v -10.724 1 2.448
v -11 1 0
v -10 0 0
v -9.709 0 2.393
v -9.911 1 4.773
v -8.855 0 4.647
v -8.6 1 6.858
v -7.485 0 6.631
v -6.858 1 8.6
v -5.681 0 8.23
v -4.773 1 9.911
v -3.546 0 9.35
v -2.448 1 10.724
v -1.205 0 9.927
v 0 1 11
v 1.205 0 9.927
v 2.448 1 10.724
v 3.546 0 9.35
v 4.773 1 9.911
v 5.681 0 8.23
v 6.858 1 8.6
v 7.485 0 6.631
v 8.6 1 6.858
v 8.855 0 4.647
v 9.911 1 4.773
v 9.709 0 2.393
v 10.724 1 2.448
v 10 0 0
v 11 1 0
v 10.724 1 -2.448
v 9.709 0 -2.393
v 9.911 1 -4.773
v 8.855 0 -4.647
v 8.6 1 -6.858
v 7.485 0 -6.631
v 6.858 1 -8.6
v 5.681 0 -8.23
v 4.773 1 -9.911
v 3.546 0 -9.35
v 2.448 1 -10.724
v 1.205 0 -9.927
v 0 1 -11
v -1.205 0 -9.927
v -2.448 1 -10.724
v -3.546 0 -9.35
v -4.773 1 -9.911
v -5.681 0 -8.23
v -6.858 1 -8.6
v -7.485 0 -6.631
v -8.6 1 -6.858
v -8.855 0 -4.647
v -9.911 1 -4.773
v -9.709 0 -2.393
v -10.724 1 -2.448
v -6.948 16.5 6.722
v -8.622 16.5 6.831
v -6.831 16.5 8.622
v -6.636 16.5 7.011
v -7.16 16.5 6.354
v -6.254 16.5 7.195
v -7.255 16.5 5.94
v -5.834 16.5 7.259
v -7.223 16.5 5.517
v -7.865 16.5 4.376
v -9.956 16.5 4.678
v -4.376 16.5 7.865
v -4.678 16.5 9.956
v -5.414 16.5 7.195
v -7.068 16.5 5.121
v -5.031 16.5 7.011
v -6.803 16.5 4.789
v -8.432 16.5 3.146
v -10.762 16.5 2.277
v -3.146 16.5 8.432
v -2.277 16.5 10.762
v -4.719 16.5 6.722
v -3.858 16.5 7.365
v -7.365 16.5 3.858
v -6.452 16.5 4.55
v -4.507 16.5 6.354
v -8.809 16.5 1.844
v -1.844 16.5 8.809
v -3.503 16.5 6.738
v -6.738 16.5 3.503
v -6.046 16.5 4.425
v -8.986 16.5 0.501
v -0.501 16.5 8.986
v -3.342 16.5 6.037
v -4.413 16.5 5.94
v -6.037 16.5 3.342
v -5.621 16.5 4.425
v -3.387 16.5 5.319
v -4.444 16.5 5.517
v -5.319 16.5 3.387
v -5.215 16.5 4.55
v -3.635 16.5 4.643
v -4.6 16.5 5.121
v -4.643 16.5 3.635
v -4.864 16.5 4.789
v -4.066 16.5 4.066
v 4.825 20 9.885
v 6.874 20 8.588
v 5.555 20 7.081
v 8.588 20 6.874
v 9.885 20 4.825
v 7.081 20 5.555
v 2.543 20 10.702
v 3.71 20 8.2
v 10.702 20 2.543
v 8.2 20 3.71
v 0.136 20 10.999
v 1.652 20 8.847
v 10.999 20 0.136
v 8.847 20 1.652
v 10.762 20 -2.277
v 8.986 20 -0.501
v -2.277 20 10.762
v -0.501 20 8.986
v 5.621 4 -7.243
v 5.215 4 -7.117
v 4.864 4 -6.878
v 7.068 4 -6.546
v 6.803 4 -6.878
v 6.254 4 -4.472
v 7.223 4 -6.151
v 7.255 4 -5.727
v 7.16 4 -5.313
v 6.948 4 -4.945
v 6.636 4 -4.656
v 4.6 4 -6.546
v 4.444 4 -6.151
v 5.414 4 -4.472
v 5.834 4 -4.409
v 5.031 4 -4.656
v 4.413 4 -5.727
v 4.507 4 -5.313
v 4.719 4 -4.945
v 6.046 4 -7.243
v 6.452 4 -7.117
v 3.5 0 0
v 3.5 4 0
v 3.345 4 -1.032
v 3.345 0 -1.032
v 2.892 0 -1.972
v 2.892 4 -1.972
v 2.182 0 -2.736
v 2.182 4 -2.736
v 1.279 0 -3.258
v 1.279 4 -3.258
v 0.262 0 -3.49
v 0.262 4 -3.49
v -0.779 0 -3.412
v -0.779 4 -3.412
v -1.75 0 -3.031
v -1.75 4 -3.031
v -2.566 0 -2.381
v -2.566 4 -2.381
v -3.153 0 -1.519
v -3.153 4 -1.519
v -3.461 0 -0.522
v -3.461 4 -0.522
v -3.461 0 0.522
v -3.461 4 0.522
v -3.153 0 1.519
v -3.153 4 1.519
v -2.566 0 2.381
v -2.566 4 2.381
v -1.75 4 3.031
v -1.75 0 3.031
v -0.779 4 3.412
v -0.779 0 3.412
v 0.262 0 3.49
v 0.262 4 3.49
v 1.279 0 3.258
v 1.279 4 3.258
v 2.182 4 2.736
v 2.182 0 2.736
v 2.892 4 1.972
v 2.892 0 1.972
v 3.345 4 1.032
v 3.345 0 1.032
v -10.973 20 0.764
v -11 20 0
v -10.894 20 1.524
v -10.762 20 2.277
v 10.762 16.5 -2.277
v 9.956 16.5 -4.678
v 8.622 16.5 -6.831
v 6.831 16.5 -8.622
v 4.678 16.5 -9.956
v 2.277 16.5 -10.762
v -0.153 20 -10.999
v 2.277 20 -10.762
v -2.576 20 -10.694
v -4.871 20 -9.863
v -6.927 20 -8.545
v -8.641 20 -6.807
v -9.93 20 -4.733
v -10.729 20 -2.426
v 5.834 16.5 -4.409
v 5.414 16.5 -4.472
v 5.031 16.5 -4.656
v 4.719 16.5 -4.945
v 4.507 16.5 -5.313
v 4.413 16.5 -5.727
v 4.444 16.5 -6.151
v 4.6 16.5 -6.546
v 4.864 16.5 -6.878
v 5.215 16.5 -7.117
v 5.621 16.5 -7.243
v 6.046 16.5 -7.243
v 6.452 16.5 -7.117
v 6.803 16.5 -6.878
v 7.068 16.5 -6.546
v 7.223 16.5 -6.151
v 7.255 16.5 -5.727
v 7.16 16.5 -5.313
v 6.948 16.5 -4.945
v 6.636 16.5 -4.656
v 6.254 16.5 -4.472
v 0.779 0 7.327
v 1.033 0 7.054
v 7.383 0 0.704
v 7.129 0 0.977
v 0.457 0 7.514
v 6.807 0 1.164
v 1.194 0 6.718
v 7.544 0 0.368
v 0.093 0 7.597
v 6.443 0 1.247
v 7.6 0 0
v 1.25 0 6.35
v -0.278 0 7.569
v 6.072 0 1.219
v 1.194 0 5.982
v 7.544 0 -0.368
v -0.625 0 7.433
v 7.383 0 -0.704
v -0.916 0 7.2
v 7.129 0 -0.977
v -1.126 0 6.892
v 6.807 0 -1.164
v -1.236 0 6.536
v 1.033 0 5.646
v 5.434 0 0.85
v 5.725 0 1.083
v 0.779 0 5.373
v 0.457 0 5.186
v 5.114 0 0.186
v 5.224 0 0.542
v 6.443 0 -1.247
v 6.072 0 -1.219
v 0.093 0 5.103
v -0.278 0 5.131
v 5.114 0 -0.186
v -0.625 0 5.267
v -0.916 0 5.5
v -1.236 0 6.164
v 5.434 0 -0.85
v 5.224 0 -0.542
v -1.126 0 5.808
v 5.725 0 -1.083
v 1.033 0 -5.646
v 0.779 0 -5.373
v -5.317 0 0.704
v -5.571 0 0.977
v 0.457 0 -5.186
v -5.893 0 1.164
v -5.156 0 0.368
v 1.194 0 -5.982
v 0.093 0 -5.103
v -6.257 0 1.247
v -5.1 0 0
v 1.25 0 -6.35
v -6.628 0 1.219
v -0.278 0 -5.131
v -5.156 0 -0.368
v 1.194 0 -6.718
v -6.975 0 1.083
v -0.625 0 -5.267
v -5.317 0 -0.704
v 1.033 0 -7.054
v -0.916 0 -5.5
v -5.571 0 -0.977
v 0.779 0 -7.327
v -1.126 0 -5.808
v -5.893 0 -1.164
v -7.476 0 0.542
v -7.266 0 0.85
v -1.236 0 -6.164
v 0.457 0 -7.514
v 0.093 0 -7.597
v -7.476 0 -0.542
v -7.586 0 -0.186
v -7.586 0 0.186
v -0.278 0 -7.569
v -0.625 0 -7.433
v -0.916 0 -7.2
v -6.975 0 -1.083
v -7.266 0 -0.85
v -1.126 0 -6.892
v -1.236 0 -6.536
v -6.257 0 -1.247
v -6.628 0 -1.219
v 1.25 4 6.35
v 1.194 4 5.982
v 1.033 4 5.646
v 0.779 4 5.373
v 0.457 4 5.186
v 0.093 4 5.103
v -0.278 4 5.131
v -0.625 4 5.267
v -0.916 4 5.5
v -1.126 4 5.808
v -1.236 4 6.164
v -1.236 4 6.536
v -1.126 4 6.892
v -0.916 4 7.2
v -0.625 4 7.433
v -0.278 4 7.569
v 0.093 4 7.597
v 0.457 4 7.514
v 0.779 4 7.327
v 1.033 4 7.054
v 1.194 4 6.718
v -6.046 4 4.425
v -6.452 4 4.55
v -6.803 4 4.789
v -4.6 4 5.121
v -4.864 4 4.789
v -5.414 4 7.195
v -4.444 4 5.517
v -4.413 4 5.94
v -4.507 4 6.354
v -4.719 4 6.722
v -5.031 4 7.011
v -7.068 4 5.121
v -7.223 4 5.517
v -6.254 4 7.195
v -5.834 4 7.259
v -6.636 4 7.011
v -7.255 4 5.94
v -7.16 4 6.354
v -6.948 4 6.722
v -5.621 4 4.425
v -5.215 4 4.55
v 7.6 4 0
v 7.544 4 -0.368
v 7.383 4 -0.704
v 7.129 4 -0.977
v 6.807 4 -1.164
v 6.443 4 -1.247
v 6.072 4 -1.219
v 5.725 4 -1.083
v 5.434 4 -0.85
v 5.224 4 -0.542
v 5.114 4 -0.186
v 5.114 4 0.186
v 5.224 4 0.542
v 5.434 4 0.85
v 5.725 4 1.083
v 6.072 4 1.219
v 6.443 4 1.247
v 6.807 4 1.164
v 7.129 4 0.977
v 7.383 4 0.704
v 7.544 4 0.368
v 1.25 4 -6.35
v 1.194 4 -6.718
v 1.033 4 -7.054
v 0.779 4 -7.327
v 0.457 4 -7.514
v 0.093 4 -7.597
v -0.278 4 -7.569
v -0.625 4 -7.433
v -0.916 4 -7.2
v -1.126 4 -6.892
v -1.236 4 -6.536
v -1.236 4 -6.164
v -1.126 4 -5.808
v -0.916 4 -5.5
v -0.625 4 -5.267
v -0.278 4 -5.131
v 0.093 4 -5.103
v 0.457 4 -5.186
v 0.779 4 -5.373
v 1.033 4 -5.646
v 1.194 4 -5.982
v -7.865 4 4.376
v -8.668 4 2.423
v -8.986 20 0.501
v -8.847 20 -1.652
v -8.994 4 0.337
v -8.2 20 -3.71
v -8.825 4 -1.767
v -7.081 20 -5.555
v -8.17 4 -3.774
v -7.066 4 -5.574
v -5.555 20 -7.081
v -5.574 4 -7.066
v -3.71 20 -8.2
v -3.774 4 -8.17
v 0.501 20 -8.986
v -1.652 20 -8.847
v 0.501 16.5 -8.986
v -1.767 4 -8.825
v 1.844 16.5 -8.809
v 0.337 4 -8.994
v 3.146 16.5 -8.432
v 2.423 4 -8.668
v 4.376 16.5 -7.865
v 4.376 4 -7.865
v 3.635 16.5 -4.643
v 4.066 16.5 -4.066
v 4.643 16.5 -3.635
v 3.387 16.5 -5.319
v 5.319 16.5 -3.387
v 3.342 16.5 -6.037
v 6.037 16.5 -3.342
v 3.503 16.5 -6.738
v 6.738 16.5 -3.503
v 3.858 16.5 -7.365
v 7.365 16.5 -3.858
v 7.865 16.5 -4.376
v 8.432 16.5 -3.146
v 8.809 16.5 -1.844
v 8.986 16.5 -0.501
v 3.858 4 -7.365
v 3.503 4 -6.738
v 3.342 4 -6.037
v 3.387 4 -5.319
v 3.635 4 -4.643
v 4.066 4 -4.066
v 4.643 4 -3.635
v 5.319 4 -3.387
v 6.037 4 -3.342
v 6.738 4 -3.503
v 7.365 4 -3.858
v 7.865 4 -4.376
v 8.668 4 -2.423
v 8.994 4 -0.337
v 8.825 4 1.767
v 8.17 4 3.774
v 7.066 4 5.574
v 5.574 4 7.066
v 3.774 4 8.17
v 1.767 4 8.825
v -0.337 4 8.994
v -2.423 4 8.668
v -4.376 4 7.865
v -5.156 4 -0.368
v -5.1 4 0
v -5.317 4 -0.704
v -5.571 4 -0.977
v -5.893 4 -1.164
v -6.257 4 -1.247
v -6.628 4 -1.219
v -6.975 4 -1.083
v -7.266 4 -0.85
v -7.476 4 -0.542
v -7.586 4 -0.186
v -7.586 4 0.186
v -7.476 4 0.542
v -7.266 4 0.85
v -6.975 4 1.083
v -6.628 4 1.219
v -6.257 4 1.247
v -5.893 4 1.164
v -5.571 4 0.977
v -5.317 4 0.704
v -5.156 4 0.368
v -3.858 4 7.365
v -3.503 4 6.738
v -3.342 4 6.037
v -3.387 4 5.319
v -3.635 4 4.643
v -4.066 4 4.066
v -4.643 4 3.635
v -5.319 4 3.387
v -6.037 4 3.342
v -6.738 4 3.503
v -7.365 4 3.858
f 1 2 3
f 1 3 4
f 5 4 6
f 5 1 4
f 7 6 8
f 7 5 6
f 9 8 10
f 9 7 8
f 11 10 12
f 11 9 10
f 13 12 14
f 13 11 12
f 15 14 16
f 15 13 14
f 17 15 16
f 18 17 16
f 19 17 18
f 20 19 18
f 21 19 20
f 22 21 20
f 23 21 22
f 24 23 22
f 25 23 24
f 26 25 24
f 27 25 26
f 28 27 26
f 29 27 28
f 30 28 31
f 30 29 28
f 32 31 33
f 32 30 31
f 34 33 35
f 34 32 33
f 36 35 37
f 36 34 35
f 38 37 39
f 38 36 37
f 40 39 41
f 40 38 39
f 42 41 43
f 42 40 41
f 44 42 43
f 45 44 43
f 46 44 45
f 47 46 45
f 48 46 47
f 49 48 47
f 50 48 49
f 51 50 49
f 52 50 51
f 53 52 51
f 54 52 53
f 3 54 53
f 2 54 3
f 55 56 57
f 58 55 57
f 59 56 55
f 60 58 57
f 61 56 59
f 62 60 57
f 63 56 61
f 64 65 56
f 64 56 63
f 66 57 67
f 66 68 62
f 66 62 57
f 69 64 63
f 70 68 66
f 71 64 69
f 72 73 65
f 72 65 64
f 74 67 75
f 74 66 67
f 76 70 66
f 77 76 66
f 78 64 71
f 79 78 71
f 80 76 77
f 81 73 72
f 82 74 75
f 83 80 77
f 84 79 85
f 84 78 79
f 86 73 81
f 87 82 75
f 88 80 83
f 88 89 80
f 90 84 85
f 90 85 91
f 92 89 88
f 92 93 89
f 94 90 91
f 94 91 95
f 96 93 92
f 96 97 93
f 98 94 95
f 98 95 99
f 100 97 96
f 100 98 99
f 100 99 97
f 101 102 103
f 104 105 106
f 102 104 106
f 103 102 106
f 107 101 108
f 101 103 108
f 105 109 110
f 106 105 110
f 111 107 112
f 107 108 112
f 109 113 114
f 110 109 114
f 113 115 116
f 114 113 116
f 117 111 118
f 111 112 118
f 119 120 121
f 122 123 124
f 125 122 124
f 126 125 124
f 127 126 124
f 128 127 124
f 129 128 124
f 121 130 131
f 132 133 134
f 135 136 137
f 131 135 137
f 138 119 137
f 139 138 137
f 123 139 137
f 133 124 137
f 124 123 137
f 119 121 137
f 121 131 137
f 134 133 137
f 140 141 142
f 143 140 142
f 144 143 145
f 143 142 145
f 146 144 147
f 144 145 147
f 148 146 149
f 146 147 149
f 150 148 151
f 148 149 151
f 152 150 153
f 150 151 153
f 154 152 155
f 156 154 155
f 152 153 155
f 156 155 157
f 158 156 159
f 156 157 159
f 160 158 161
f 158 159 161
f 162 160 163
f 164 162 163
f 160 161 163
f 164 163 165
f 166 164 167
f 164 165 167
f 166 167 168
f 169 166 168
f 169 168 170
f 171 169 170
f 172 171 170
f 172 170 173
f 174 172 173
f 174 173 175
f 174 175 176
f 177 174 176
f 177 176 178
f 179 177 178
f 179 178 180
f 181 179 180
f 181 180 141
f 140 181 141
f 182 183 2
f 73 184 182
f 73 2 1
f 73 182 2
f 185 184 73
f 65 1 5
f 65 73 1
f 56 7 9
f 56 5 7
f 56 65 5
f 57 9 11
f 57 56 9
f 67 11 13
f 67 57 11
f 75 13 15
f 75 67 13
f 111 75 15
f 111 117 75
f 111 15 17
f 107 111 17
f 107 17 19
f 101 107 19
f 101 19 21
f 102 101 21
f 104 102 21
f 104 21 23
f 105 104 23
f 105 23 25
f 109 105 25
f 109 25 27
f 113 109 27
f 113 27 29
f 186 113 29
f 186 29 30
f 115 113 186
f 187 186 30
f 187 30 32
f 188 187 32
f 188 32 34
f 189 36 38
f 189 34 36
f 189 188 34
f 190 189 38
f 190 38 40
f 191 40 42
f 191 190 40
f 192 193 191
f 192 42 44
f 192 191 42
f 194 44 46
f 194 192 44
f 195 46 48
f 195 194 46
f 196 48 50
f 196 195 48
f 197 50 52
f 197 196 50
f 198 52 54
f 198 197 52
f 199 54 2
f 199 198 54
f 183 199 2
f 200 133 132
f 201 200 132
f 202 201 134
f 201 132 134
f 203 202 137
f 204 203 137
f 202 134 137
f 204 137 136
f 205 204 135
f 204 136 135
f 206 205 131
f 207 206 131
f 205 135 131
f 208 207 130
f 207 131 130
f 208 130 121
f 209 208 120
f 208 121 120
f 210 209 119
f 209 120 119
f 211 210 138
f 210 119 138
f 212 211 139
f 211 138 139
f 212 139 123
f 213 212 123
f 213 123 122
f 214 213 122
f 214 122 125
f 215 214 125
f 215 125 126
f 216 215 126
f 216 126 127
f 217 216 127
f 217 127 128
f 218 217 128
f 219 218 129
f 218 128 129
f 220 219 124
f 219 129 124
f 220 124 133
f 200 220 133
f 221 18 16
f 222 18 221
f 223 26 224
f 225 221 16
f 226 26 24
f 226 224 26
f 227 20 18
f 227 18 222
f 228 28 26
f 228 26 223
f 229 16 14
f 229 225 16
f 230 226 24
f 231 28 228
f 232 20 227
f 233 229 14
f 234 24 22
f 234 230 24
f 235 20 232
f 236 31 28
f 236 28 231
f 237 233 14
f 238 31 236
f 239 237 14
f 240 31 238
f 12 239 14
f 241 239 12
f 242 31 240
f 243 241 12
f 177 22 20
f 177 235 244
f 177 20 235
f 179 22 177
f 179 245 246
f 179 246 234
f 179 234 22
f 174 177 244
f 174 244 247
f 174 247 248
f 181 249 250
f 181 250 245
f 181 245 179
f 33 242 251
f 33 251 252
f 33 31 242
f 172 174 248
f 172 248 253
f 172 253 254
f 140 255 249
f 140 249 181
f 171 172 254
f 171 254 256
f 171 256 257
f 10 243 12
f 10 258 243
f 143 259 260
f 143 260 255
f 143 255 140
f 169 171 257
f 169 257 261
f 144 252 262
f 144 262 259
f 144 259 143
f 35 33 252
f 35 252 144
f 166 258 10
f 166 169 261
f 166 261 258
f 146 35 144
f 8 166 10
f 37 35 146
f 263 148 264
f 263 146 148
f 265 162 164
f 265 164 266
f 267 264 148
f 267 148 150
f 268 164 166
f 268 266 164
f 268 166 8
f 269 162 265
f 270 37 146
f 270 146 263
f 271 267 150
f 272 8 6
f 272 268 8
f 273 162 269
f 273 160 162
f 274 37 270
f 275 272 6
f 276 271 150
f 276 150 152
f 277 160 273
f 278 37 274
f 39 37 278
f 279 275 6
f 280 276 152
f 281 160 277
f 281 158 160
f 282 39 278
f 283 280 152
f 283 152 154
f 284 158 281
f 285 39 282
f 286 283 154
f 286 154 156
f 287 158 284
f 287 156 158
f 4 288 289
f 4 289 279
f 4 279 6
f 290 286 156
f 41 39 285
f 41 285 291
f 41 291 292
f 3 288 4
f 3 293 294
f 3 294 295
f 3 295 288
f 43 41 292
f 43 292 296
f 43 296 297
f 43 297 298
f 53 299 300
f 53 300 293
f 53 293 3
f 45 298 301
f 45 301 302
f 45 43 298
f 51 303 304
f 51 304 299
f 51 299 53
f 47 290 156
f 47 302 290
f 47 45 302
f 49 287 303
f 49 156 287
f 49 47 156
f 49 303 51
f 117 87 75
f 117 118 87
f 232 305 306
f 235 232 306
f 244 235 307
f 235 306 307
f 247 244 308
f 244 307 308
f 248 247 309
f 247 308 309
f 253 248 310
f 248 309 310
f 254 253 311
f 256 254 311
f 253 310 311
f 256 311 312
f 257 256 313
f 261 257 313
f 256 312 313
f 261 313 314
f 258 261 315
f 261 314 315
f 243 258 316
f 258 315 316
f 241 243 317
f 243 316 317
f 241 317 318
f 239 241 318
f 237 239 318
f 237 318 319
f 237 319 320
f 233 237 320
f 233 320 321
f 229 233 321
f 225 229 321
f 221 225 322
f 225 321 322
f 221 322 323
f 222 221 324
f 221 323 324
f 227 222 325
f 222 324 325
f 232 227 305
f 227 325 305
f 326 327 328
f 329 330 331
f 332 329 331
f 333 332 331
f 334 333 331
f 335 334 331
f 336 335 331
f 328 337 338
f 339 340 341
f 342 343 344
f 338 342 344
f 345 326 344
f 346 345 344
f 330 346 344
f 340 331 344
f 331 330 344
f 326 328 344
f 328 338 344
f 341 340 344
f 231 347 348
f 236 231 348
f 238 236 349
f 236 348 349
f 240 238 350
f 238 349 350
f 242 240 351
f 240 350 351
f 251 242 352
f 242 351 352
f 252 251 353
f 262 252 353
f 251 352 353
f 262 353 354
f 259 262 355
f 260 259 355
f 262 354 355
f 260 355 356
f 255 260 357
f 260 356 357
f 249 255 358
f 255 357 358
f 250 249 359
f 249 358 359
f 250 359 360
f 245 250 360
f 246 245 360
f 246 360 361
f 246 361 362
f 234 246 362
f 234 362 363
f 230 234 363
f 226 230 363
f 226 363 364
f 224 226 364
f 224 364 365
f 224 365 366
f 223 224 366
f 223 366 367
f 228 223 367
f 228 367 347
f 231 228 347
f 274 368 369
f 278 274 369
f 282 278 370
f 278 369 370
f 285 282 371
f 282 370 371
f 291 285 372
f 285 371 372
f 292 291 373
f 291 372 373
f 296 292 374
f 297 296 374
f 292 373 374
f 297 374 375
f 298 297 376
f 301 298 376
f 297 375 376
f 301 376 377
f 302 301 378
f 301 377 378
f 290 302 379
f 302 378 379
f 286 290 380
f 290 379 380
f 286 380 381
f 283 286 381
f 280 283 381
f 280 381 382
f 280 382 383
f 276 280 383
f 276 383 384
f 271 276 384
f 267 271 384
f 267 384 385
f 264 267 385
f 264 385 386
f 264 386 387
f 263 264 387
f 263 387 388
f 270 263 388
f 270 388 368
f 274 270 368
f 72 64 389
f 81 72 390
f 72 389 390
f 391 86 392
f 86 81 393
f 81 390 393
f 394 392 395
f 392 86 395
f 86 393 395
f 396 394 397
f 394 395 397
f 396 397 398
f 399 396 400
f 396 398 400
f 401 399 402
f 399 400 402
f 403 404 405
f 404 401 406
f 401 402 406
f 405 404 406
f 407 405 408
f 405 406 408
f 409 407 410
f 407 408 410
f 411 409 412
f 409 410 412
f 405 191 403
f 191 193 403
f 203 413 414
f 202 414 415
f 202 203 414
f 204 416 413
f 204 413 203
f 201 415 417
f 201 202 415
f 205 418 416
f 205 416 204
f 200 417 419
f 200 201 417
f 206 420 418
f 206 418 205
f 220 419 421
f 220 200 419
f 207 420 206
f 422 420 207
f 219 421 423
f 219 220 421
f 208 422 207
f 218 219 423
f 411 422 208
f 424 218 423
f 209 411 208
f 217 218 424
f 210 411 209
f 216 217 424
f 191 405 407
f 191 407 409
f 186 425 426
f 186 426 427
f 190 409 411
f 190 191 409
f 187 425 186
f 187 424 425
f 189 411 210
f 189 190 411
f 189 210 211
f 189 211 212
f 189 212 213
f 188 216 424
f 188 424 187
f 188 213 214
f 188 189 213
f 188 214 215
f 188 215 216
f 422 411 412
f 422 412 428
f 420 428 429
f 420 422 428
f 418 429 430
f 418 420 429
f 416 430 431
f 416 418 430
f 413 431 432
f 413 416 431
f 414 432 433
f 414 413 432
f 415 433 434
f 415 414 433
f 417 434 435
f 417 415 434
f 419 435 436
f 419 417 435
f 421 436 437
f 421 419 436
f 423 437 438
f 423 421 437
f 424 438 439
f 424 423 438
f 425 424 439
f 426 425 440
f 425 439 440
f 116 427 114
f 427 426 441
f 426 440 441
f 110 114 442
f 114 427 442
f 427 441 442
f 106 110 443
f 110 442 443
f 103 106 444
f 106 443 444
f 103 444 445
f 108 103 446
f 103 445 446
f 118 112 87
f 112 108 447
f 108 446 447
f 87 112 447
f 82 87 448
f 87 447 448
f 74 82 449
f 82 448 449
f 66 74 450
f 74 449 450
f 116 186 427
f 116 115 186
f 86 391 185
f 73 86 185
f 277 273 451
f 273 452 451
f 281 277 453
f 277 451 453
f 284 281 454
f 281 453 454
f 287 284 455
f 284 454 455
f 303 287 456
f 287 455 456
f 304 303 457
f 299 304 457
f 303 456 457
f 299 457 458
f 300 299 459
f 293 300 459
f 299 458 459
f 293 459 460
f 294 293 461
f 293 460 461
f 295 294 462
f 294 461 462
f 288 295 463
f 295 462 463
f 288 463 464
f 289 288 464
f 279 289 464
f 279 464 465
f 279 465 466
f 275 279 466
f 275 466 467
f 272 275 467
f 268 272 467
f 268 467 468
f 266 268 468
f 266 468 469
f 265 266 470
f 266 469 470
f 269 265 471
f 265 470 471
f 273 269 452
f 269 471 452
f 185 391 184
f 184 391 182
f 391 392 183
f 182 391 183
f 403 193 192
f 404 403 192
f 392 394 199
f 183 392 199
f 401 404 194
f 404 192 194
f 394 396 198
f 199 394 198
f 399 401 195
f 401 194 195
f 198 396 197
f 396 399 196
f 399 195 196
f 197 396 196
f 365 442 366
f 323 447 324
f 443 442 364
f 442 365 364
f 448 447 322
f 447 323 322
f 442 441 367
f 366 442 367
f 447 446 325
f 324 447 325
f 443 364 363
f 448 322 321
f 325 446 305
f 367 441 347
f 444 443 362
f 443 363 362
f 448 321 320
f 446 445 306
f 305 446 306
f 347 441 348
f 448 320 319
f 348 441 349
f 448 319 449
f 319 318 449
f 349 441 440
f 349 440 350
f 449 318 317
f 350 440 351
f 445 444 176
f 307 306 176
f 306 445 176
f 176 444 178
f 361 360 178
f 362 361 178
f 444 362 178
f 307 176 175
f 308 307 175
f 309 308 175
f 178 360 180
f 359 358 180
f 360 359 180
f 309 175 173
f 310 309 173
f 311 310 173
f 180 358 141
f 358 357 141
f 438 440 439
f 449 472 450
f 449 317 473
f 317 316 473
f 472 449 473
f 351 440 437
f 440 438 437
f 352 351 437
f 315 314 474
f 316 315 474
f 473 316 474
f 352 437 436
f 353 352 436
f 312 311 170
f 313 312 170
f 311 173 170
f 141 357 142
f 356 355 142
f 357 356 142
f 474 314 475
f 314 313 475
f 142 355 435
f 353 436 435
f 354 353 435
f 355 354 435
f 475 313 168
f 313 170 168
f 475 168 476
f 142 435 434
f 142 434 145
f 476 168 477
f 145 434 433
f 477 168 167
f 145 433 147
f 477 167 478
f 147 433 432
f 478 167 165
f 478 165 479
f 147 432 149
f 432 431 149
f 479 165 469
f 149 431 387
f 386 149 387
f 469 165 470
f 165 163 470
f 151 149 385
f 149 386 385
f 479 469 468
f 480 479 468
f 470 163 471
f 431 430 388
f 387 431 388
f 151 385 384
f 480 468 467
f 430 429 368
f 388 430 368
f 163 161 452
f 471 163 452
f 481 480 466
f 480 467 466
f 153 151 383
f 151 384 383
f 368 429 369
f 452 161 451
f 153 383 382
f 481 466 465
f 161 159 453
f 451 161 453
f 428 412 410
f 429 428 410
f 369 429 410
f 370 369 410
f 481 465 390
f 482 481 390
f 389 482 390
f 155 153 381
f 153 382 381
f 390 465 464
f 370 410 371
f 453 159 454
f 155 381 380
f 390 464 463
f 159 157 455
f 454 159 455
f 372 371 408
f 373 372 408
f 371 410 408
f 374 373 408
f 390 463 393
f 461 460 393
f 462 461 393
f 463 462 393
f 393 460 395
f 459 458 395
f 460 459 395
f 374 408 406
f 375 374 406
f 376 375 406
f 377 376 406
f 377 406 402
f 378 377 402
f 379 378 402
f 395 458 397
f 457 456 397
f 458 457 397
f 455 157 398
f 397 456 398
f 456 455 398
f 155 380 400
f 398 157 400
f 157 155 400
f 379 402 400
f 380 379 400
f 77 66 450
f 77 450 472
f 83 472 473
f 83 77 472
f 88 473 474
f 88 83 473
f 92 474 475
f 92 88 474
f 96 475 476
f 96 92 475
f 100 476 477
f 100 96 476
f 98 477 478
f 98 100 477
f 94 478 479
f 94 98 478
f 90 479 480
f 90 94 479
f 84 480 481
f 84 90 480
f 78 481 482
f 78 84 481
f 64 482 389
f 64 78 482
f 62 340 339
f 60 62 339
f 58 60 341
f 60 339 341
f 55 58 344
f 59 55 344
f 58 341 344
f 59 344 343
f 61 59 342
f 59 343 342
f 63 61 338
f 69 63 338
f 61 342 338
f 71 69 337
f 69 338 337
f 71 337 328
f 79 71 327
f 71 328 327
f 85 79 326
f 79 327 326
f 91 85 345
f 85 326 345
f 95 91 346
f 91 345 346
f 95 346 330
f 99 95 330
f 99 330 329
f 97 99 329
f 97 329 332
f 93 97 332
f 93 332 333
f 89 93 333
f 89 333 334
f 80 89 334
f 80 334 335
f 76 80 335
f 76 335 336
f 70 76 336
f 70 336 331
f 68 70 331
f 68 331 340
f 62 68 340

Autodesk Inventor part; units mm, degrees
ref_plane "YZ Plane" through (0, 0, 0) normal (1, 0, 0) x (0, 1, 0)
ref_plane "XZ Plane" through (0, 0, 0) normal (0, 1, 0) x (-1, 0, 0)
ref_plane "XY Plane" through (0, 0, 0) normal (0, 0, 1) x (1, 0, 0)
sketch "Esboço1" plane through (0, 0, 0) normal (0, 0, 1) x (1, 0, 0)
  line L0 (-9, 20) -> (-9, 4)
  line L1 (-9, 4) -> (0, 4)
  line L2 (0, 4) -> (0, 0)
  line L3 (0, 0) -> (-10, 0)
  line L4 (-11, 1) -> (-11, 20)
  line L5 (-11, 1) -> (-10, 0)
  line L6 (-11, 20) -> (-9, 20)
  dimension "d0" = 18
  dimension "d1" = 2
  dimension "d2" = 4
  dimension "d10" = 45
  dimension "d11" = 1
  dimension "d30" = 20
revolve "Revolução1" add sketch "Esboço1" angle 360 about axis through (0, 4, 0) along (0, -1, 0)
sketch "Esboço2" plane through (0, 4, 0) normal (0, 1, 0) x (1, 0, 0)
  circle A0 centre (0, 0) radius 3.5
  circle A1 centre (0, 0) radius 6.35 construction
  circle A2 centre (0, 6.35) radius 1.25
  circle A3 centre (0, -6.35) radius 1.25
  circle A4 centre (-6.35, 0) radius 1.25
  circle A5 centre (6.35, 0) radius 1.25
  circle A6 centre (0, 6.35) radius 2.5
  dimension "d12" = 7
  dimension "d13" = 12.7
  dimension "d14" = 2.5
  dimension "d48" = 5
extrude "Extrusão1" cut sketch "Esboço2" against normal through all contours A0 | A2 | A3 | A4 | A5
sketch "Esboço5" plane through (0, 20, 0) normal (0, 1, 0) x (1, 0, 0)
  circle A0 centre (0, 0) radius 9 projected
  arc A1 (-4.3758, -7.8646) -> (-7.8646, -4.3758) centre (-5.8336, -5.8336) ccw
  line L0 (-15.4, 0) -> (15.4, 0) projected
  circle A2 centre (0, 0) radius 8.25 construction
  arc A3 (4.3758, 7.8646) -> (7.8646, 4.3758) centre (5.8336, 5.8336) ccw
  line L1 (-5.8336, -5.8336) -> (5.8336, 5.8336) construction
  dimension "d32" = 2.5
  dimension "d49" = 45
  dimension "d50" = 16.5
extrude "Extrusão4" add sketch "Esboço5" against normal up to surface (16 mm away) contours A3 A0 | A0 A1
sketch "Esboço7" plane through (0, 20, 0) normal (0, 1, 0) x (1, 0, 0)
  arc A0 (-4.3758, -7.8646) -> (-7.8646, -4.3758) centre (-5.8336, -5.8336) ccw projected
  arc A1 (4.3758, 7.8646) -> (7.8646, 4.3758) centre (5.8336, 5.8336) ccw projected
  point P0 (0, 0)
hole "Furo1" at (-5.8336, 20, 5.8336) at (5.8336, 20, -5.8336) direction (0, -1, 0) diameter 2.85 depth 16 thread size "M3.5x0.6" class "6H" standard "ANSI Metric M Profile"
sketch "Esboço6" plane through (0, 20, 0) normal (0, 1, 0) x (1, 0, 0)
  circle A0 centre (0, 0) radius 11 projected
  line L0 (2.2766, 10.7618) -> (-10.7618, -2.2766)
  line L1 (10.7618, 2.2766) -> (-2.2766, -10.7618)
  circle A1 centre (0, 0) radius 11 projected
  line L2 (-5.8336, -5.8336) -> (5.8336, 5.8336) construction
  circle A2 centre (-5.8336, -5.8336) radius 1.425 projected
  circle A3 centre (5.8336, 5.8336) radius 1.425 projected
  point P0 (-2.2766, -10.7618)
  dimension "d45" = 12
extrude "Extrusão5" cut sketch "Esboço6" against normal blind 3.5 contours L1 A0 L0 | A2 | A3
properties part number "_3DPrint"
